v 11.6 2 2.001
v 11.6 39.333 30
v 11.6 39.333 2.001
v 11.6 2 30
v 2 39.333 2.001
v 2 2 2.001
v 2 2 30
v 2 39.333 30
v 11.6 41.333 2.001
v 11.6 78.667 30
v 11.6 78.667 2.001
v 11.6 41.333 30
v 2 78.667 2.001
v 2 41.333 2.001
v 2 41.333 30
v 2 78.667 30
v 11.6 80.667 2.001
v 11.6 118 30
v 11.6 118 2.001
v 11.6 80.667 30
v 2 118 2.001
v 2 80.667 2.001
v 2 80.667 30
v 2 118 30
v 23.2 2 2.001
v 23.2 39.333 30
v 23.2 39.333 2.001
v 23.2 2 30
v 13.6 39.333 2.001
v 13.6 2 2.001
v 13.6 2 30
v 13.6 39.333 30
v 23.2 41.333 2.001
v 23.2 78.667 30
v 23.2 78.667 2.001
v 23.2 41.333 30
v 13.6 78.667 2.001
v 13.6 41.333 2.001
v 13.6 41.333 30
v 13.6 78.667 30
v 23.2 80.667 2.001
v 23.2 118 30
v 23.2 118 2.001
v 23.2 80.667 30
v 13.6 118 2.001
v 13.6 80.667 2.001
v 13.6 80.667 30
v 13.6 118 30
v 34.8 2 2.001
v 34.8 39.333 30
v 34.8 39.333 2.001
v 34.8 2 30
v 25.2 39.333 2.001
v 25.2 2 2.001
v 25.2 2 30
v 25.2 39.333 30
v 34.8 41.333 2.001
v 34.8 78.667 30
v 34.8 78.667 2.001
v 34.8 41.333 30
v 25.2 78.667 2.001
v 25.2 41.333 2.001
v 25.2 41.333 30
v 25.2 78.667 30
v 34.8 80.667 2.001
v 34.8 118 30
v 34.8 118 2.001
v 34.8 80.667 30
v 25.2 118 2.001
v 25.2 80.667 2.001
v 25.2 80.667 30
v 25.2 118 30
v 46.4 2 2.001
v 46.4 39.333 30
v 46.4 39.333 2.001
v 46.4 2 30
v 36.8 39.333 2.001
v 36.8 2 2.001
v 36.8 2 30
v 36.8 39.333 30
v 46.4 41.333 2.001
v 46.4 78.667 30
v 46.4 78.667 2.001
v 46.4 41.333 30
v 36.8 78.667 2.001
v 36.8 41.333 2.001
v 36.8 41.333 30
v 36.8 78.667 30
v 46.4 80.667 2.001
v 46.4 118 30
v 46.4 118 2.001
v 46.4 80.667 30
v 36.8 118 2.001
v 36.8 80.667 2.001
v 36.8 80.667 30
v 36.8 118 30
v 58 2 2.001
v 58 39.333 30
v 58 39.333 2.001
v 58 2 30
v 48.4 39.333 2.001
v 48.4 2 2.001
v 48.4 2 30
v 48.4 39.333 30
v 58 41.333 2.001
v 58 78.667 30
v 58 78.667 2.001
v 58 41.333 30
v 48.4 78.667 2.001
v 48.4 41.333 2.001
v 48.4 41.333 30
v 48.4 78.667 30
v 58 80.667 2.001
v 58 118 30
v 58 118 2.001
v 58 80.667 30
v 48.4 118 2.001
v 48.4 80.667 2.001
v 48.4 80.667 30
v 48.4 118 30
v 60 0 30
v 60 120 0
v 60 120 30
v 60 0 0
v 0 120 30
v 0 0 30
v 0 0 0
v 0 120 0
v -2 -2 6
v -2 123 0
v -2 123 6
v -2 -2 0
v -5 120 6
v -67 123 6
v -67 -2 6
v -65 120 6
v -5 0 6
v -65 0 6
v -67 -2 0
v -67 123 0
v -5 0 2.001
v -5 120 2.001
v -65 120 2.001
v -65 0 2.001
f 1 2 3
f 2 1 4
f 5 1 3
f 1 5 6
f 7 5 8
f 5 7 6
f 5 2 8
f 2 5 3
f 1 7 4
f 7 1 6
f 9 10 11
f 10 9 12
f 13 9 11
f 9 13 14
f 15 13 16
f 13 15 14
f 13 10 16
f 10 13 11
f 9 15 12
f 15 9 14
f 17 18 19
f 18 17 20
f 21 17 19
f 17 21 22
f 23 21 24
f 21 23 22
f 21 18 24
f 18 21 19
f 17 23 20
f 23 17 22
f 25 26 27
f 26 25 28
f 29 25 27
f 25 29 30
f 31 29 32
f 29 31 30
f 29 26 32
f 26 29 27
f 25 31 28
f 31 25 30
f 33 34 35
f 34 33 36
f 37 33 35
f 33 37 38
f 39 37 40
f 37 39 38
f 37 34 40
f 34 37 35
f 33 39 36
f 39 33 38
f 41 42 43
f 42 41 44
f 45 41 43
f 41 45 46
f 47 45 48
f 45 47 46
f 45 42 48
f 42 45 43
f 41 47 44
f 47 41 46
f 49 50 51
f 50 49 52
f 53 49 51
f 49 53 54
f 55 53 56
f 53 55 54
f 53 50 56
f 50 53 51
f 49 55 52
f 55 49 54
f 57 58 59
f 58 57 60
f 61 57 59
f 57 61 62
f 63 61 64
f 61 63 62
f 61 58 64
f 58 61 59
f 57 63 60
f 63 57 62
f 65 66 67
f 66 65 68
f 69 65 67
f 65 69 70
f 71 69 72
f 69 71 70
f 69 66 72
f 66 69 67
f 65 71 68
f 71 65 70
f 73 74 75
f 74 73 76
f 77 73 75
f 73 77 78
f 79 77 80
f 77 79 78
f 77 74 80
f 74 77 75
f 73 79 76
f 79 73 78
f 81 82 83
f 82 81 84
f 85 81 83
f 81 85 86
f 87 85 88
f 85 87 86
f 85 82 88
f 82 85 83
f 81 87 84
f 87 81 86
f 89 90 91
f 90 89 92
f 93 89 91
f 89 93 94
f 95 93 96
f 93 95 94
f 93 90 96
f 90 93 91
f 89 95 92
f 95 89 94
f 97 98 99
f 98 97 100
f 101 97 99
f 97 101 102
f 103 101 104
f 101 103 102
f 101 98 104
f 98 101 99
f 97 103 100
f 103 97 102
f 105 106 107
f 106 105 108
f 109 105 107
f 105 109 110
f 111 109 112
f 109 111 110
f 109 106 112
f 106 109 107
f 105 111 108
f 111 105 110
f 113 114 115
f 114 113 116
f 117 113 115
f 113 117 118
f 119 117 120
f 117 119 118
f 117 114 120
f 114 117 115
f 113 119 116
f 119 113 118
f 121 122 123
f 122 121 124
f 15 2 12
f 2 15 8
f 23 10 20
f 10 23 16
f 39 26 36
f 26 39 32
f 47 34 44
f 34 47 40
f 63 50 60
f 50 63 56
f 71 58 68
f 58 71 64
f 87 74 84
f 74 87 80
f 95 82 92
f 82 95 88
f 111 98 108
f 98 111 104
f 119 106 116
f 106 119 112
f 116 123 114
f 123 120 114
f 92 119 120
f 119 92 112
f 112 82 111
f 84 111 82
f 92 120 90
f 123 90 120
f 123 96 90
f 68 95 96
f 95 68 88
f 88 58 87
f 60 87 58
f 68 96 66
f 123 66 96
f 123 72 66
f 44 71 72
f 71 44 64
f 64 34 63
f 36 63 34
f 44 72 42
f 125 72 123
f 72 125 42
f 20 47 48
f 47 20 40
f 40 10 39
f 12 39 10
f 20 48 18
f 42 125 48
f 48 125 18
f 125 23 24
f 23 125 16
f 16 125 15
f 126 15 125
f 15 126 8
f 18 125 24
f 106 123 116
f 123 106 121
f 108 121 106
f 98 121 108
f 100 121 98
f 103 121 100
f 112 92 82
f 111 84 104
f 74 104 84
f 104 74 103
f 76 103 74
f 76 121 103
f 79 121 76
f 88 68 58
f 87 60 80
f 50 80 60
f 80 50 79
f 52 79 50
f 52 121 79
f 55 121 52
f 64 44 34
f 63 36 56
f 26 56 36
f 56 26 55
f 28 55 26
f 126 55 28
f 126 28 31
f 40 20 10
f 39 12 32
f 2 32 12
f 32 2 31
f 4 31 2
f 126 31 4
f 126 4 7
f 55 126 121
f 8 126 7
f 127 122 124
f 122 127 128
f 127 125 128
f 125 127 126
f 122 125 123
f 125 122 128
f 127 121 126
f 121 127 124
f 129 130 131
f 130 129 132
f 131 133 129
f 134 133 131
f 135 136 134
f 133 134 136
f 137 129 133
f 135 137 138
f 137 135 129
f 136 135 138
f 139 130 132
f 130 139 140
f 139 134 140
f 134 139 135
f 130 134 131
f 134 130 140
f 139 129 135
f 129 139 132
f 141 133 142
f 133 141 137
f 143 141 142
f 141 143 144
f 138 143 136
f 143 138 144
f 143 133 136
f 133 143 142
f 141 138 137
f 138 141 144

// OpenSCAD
//Box Depth (X)
x=60;

//Box Thickness (Y)
y=120;

//Box Height (Z)
z=30;

//Box Wall Thickness
h=2;

//Number of Rows
r=5;

//Number of Columns
c=3;

$fn=100;

module Body()
{cube([x,y,z]);}

module Lid()
{difference(){
    cube([x+1+2*h,y+1+2*h,z/5]);
    translate([h,h,h+.001])cube([x,y,(z/5-h)]);
    }
}

module Hole (){
cube([((x-h-r*(h))/r),(y-h-c*(h))/(c),z-h]);}

module Pattern (){
    for (i=[1:r]){
        for (j=[1:c]){
            translate ([h*(i)+(i-1)*(x-h-r*(h))/r,h*(j)+(j-1)*(y-h-c*(h))/(c),h+.001])Hole();
        }
    }}
    
difference ()
{
    Body();
    Pattern();
}

translate ([-x-5-h,-h,0])Lid();   
    
